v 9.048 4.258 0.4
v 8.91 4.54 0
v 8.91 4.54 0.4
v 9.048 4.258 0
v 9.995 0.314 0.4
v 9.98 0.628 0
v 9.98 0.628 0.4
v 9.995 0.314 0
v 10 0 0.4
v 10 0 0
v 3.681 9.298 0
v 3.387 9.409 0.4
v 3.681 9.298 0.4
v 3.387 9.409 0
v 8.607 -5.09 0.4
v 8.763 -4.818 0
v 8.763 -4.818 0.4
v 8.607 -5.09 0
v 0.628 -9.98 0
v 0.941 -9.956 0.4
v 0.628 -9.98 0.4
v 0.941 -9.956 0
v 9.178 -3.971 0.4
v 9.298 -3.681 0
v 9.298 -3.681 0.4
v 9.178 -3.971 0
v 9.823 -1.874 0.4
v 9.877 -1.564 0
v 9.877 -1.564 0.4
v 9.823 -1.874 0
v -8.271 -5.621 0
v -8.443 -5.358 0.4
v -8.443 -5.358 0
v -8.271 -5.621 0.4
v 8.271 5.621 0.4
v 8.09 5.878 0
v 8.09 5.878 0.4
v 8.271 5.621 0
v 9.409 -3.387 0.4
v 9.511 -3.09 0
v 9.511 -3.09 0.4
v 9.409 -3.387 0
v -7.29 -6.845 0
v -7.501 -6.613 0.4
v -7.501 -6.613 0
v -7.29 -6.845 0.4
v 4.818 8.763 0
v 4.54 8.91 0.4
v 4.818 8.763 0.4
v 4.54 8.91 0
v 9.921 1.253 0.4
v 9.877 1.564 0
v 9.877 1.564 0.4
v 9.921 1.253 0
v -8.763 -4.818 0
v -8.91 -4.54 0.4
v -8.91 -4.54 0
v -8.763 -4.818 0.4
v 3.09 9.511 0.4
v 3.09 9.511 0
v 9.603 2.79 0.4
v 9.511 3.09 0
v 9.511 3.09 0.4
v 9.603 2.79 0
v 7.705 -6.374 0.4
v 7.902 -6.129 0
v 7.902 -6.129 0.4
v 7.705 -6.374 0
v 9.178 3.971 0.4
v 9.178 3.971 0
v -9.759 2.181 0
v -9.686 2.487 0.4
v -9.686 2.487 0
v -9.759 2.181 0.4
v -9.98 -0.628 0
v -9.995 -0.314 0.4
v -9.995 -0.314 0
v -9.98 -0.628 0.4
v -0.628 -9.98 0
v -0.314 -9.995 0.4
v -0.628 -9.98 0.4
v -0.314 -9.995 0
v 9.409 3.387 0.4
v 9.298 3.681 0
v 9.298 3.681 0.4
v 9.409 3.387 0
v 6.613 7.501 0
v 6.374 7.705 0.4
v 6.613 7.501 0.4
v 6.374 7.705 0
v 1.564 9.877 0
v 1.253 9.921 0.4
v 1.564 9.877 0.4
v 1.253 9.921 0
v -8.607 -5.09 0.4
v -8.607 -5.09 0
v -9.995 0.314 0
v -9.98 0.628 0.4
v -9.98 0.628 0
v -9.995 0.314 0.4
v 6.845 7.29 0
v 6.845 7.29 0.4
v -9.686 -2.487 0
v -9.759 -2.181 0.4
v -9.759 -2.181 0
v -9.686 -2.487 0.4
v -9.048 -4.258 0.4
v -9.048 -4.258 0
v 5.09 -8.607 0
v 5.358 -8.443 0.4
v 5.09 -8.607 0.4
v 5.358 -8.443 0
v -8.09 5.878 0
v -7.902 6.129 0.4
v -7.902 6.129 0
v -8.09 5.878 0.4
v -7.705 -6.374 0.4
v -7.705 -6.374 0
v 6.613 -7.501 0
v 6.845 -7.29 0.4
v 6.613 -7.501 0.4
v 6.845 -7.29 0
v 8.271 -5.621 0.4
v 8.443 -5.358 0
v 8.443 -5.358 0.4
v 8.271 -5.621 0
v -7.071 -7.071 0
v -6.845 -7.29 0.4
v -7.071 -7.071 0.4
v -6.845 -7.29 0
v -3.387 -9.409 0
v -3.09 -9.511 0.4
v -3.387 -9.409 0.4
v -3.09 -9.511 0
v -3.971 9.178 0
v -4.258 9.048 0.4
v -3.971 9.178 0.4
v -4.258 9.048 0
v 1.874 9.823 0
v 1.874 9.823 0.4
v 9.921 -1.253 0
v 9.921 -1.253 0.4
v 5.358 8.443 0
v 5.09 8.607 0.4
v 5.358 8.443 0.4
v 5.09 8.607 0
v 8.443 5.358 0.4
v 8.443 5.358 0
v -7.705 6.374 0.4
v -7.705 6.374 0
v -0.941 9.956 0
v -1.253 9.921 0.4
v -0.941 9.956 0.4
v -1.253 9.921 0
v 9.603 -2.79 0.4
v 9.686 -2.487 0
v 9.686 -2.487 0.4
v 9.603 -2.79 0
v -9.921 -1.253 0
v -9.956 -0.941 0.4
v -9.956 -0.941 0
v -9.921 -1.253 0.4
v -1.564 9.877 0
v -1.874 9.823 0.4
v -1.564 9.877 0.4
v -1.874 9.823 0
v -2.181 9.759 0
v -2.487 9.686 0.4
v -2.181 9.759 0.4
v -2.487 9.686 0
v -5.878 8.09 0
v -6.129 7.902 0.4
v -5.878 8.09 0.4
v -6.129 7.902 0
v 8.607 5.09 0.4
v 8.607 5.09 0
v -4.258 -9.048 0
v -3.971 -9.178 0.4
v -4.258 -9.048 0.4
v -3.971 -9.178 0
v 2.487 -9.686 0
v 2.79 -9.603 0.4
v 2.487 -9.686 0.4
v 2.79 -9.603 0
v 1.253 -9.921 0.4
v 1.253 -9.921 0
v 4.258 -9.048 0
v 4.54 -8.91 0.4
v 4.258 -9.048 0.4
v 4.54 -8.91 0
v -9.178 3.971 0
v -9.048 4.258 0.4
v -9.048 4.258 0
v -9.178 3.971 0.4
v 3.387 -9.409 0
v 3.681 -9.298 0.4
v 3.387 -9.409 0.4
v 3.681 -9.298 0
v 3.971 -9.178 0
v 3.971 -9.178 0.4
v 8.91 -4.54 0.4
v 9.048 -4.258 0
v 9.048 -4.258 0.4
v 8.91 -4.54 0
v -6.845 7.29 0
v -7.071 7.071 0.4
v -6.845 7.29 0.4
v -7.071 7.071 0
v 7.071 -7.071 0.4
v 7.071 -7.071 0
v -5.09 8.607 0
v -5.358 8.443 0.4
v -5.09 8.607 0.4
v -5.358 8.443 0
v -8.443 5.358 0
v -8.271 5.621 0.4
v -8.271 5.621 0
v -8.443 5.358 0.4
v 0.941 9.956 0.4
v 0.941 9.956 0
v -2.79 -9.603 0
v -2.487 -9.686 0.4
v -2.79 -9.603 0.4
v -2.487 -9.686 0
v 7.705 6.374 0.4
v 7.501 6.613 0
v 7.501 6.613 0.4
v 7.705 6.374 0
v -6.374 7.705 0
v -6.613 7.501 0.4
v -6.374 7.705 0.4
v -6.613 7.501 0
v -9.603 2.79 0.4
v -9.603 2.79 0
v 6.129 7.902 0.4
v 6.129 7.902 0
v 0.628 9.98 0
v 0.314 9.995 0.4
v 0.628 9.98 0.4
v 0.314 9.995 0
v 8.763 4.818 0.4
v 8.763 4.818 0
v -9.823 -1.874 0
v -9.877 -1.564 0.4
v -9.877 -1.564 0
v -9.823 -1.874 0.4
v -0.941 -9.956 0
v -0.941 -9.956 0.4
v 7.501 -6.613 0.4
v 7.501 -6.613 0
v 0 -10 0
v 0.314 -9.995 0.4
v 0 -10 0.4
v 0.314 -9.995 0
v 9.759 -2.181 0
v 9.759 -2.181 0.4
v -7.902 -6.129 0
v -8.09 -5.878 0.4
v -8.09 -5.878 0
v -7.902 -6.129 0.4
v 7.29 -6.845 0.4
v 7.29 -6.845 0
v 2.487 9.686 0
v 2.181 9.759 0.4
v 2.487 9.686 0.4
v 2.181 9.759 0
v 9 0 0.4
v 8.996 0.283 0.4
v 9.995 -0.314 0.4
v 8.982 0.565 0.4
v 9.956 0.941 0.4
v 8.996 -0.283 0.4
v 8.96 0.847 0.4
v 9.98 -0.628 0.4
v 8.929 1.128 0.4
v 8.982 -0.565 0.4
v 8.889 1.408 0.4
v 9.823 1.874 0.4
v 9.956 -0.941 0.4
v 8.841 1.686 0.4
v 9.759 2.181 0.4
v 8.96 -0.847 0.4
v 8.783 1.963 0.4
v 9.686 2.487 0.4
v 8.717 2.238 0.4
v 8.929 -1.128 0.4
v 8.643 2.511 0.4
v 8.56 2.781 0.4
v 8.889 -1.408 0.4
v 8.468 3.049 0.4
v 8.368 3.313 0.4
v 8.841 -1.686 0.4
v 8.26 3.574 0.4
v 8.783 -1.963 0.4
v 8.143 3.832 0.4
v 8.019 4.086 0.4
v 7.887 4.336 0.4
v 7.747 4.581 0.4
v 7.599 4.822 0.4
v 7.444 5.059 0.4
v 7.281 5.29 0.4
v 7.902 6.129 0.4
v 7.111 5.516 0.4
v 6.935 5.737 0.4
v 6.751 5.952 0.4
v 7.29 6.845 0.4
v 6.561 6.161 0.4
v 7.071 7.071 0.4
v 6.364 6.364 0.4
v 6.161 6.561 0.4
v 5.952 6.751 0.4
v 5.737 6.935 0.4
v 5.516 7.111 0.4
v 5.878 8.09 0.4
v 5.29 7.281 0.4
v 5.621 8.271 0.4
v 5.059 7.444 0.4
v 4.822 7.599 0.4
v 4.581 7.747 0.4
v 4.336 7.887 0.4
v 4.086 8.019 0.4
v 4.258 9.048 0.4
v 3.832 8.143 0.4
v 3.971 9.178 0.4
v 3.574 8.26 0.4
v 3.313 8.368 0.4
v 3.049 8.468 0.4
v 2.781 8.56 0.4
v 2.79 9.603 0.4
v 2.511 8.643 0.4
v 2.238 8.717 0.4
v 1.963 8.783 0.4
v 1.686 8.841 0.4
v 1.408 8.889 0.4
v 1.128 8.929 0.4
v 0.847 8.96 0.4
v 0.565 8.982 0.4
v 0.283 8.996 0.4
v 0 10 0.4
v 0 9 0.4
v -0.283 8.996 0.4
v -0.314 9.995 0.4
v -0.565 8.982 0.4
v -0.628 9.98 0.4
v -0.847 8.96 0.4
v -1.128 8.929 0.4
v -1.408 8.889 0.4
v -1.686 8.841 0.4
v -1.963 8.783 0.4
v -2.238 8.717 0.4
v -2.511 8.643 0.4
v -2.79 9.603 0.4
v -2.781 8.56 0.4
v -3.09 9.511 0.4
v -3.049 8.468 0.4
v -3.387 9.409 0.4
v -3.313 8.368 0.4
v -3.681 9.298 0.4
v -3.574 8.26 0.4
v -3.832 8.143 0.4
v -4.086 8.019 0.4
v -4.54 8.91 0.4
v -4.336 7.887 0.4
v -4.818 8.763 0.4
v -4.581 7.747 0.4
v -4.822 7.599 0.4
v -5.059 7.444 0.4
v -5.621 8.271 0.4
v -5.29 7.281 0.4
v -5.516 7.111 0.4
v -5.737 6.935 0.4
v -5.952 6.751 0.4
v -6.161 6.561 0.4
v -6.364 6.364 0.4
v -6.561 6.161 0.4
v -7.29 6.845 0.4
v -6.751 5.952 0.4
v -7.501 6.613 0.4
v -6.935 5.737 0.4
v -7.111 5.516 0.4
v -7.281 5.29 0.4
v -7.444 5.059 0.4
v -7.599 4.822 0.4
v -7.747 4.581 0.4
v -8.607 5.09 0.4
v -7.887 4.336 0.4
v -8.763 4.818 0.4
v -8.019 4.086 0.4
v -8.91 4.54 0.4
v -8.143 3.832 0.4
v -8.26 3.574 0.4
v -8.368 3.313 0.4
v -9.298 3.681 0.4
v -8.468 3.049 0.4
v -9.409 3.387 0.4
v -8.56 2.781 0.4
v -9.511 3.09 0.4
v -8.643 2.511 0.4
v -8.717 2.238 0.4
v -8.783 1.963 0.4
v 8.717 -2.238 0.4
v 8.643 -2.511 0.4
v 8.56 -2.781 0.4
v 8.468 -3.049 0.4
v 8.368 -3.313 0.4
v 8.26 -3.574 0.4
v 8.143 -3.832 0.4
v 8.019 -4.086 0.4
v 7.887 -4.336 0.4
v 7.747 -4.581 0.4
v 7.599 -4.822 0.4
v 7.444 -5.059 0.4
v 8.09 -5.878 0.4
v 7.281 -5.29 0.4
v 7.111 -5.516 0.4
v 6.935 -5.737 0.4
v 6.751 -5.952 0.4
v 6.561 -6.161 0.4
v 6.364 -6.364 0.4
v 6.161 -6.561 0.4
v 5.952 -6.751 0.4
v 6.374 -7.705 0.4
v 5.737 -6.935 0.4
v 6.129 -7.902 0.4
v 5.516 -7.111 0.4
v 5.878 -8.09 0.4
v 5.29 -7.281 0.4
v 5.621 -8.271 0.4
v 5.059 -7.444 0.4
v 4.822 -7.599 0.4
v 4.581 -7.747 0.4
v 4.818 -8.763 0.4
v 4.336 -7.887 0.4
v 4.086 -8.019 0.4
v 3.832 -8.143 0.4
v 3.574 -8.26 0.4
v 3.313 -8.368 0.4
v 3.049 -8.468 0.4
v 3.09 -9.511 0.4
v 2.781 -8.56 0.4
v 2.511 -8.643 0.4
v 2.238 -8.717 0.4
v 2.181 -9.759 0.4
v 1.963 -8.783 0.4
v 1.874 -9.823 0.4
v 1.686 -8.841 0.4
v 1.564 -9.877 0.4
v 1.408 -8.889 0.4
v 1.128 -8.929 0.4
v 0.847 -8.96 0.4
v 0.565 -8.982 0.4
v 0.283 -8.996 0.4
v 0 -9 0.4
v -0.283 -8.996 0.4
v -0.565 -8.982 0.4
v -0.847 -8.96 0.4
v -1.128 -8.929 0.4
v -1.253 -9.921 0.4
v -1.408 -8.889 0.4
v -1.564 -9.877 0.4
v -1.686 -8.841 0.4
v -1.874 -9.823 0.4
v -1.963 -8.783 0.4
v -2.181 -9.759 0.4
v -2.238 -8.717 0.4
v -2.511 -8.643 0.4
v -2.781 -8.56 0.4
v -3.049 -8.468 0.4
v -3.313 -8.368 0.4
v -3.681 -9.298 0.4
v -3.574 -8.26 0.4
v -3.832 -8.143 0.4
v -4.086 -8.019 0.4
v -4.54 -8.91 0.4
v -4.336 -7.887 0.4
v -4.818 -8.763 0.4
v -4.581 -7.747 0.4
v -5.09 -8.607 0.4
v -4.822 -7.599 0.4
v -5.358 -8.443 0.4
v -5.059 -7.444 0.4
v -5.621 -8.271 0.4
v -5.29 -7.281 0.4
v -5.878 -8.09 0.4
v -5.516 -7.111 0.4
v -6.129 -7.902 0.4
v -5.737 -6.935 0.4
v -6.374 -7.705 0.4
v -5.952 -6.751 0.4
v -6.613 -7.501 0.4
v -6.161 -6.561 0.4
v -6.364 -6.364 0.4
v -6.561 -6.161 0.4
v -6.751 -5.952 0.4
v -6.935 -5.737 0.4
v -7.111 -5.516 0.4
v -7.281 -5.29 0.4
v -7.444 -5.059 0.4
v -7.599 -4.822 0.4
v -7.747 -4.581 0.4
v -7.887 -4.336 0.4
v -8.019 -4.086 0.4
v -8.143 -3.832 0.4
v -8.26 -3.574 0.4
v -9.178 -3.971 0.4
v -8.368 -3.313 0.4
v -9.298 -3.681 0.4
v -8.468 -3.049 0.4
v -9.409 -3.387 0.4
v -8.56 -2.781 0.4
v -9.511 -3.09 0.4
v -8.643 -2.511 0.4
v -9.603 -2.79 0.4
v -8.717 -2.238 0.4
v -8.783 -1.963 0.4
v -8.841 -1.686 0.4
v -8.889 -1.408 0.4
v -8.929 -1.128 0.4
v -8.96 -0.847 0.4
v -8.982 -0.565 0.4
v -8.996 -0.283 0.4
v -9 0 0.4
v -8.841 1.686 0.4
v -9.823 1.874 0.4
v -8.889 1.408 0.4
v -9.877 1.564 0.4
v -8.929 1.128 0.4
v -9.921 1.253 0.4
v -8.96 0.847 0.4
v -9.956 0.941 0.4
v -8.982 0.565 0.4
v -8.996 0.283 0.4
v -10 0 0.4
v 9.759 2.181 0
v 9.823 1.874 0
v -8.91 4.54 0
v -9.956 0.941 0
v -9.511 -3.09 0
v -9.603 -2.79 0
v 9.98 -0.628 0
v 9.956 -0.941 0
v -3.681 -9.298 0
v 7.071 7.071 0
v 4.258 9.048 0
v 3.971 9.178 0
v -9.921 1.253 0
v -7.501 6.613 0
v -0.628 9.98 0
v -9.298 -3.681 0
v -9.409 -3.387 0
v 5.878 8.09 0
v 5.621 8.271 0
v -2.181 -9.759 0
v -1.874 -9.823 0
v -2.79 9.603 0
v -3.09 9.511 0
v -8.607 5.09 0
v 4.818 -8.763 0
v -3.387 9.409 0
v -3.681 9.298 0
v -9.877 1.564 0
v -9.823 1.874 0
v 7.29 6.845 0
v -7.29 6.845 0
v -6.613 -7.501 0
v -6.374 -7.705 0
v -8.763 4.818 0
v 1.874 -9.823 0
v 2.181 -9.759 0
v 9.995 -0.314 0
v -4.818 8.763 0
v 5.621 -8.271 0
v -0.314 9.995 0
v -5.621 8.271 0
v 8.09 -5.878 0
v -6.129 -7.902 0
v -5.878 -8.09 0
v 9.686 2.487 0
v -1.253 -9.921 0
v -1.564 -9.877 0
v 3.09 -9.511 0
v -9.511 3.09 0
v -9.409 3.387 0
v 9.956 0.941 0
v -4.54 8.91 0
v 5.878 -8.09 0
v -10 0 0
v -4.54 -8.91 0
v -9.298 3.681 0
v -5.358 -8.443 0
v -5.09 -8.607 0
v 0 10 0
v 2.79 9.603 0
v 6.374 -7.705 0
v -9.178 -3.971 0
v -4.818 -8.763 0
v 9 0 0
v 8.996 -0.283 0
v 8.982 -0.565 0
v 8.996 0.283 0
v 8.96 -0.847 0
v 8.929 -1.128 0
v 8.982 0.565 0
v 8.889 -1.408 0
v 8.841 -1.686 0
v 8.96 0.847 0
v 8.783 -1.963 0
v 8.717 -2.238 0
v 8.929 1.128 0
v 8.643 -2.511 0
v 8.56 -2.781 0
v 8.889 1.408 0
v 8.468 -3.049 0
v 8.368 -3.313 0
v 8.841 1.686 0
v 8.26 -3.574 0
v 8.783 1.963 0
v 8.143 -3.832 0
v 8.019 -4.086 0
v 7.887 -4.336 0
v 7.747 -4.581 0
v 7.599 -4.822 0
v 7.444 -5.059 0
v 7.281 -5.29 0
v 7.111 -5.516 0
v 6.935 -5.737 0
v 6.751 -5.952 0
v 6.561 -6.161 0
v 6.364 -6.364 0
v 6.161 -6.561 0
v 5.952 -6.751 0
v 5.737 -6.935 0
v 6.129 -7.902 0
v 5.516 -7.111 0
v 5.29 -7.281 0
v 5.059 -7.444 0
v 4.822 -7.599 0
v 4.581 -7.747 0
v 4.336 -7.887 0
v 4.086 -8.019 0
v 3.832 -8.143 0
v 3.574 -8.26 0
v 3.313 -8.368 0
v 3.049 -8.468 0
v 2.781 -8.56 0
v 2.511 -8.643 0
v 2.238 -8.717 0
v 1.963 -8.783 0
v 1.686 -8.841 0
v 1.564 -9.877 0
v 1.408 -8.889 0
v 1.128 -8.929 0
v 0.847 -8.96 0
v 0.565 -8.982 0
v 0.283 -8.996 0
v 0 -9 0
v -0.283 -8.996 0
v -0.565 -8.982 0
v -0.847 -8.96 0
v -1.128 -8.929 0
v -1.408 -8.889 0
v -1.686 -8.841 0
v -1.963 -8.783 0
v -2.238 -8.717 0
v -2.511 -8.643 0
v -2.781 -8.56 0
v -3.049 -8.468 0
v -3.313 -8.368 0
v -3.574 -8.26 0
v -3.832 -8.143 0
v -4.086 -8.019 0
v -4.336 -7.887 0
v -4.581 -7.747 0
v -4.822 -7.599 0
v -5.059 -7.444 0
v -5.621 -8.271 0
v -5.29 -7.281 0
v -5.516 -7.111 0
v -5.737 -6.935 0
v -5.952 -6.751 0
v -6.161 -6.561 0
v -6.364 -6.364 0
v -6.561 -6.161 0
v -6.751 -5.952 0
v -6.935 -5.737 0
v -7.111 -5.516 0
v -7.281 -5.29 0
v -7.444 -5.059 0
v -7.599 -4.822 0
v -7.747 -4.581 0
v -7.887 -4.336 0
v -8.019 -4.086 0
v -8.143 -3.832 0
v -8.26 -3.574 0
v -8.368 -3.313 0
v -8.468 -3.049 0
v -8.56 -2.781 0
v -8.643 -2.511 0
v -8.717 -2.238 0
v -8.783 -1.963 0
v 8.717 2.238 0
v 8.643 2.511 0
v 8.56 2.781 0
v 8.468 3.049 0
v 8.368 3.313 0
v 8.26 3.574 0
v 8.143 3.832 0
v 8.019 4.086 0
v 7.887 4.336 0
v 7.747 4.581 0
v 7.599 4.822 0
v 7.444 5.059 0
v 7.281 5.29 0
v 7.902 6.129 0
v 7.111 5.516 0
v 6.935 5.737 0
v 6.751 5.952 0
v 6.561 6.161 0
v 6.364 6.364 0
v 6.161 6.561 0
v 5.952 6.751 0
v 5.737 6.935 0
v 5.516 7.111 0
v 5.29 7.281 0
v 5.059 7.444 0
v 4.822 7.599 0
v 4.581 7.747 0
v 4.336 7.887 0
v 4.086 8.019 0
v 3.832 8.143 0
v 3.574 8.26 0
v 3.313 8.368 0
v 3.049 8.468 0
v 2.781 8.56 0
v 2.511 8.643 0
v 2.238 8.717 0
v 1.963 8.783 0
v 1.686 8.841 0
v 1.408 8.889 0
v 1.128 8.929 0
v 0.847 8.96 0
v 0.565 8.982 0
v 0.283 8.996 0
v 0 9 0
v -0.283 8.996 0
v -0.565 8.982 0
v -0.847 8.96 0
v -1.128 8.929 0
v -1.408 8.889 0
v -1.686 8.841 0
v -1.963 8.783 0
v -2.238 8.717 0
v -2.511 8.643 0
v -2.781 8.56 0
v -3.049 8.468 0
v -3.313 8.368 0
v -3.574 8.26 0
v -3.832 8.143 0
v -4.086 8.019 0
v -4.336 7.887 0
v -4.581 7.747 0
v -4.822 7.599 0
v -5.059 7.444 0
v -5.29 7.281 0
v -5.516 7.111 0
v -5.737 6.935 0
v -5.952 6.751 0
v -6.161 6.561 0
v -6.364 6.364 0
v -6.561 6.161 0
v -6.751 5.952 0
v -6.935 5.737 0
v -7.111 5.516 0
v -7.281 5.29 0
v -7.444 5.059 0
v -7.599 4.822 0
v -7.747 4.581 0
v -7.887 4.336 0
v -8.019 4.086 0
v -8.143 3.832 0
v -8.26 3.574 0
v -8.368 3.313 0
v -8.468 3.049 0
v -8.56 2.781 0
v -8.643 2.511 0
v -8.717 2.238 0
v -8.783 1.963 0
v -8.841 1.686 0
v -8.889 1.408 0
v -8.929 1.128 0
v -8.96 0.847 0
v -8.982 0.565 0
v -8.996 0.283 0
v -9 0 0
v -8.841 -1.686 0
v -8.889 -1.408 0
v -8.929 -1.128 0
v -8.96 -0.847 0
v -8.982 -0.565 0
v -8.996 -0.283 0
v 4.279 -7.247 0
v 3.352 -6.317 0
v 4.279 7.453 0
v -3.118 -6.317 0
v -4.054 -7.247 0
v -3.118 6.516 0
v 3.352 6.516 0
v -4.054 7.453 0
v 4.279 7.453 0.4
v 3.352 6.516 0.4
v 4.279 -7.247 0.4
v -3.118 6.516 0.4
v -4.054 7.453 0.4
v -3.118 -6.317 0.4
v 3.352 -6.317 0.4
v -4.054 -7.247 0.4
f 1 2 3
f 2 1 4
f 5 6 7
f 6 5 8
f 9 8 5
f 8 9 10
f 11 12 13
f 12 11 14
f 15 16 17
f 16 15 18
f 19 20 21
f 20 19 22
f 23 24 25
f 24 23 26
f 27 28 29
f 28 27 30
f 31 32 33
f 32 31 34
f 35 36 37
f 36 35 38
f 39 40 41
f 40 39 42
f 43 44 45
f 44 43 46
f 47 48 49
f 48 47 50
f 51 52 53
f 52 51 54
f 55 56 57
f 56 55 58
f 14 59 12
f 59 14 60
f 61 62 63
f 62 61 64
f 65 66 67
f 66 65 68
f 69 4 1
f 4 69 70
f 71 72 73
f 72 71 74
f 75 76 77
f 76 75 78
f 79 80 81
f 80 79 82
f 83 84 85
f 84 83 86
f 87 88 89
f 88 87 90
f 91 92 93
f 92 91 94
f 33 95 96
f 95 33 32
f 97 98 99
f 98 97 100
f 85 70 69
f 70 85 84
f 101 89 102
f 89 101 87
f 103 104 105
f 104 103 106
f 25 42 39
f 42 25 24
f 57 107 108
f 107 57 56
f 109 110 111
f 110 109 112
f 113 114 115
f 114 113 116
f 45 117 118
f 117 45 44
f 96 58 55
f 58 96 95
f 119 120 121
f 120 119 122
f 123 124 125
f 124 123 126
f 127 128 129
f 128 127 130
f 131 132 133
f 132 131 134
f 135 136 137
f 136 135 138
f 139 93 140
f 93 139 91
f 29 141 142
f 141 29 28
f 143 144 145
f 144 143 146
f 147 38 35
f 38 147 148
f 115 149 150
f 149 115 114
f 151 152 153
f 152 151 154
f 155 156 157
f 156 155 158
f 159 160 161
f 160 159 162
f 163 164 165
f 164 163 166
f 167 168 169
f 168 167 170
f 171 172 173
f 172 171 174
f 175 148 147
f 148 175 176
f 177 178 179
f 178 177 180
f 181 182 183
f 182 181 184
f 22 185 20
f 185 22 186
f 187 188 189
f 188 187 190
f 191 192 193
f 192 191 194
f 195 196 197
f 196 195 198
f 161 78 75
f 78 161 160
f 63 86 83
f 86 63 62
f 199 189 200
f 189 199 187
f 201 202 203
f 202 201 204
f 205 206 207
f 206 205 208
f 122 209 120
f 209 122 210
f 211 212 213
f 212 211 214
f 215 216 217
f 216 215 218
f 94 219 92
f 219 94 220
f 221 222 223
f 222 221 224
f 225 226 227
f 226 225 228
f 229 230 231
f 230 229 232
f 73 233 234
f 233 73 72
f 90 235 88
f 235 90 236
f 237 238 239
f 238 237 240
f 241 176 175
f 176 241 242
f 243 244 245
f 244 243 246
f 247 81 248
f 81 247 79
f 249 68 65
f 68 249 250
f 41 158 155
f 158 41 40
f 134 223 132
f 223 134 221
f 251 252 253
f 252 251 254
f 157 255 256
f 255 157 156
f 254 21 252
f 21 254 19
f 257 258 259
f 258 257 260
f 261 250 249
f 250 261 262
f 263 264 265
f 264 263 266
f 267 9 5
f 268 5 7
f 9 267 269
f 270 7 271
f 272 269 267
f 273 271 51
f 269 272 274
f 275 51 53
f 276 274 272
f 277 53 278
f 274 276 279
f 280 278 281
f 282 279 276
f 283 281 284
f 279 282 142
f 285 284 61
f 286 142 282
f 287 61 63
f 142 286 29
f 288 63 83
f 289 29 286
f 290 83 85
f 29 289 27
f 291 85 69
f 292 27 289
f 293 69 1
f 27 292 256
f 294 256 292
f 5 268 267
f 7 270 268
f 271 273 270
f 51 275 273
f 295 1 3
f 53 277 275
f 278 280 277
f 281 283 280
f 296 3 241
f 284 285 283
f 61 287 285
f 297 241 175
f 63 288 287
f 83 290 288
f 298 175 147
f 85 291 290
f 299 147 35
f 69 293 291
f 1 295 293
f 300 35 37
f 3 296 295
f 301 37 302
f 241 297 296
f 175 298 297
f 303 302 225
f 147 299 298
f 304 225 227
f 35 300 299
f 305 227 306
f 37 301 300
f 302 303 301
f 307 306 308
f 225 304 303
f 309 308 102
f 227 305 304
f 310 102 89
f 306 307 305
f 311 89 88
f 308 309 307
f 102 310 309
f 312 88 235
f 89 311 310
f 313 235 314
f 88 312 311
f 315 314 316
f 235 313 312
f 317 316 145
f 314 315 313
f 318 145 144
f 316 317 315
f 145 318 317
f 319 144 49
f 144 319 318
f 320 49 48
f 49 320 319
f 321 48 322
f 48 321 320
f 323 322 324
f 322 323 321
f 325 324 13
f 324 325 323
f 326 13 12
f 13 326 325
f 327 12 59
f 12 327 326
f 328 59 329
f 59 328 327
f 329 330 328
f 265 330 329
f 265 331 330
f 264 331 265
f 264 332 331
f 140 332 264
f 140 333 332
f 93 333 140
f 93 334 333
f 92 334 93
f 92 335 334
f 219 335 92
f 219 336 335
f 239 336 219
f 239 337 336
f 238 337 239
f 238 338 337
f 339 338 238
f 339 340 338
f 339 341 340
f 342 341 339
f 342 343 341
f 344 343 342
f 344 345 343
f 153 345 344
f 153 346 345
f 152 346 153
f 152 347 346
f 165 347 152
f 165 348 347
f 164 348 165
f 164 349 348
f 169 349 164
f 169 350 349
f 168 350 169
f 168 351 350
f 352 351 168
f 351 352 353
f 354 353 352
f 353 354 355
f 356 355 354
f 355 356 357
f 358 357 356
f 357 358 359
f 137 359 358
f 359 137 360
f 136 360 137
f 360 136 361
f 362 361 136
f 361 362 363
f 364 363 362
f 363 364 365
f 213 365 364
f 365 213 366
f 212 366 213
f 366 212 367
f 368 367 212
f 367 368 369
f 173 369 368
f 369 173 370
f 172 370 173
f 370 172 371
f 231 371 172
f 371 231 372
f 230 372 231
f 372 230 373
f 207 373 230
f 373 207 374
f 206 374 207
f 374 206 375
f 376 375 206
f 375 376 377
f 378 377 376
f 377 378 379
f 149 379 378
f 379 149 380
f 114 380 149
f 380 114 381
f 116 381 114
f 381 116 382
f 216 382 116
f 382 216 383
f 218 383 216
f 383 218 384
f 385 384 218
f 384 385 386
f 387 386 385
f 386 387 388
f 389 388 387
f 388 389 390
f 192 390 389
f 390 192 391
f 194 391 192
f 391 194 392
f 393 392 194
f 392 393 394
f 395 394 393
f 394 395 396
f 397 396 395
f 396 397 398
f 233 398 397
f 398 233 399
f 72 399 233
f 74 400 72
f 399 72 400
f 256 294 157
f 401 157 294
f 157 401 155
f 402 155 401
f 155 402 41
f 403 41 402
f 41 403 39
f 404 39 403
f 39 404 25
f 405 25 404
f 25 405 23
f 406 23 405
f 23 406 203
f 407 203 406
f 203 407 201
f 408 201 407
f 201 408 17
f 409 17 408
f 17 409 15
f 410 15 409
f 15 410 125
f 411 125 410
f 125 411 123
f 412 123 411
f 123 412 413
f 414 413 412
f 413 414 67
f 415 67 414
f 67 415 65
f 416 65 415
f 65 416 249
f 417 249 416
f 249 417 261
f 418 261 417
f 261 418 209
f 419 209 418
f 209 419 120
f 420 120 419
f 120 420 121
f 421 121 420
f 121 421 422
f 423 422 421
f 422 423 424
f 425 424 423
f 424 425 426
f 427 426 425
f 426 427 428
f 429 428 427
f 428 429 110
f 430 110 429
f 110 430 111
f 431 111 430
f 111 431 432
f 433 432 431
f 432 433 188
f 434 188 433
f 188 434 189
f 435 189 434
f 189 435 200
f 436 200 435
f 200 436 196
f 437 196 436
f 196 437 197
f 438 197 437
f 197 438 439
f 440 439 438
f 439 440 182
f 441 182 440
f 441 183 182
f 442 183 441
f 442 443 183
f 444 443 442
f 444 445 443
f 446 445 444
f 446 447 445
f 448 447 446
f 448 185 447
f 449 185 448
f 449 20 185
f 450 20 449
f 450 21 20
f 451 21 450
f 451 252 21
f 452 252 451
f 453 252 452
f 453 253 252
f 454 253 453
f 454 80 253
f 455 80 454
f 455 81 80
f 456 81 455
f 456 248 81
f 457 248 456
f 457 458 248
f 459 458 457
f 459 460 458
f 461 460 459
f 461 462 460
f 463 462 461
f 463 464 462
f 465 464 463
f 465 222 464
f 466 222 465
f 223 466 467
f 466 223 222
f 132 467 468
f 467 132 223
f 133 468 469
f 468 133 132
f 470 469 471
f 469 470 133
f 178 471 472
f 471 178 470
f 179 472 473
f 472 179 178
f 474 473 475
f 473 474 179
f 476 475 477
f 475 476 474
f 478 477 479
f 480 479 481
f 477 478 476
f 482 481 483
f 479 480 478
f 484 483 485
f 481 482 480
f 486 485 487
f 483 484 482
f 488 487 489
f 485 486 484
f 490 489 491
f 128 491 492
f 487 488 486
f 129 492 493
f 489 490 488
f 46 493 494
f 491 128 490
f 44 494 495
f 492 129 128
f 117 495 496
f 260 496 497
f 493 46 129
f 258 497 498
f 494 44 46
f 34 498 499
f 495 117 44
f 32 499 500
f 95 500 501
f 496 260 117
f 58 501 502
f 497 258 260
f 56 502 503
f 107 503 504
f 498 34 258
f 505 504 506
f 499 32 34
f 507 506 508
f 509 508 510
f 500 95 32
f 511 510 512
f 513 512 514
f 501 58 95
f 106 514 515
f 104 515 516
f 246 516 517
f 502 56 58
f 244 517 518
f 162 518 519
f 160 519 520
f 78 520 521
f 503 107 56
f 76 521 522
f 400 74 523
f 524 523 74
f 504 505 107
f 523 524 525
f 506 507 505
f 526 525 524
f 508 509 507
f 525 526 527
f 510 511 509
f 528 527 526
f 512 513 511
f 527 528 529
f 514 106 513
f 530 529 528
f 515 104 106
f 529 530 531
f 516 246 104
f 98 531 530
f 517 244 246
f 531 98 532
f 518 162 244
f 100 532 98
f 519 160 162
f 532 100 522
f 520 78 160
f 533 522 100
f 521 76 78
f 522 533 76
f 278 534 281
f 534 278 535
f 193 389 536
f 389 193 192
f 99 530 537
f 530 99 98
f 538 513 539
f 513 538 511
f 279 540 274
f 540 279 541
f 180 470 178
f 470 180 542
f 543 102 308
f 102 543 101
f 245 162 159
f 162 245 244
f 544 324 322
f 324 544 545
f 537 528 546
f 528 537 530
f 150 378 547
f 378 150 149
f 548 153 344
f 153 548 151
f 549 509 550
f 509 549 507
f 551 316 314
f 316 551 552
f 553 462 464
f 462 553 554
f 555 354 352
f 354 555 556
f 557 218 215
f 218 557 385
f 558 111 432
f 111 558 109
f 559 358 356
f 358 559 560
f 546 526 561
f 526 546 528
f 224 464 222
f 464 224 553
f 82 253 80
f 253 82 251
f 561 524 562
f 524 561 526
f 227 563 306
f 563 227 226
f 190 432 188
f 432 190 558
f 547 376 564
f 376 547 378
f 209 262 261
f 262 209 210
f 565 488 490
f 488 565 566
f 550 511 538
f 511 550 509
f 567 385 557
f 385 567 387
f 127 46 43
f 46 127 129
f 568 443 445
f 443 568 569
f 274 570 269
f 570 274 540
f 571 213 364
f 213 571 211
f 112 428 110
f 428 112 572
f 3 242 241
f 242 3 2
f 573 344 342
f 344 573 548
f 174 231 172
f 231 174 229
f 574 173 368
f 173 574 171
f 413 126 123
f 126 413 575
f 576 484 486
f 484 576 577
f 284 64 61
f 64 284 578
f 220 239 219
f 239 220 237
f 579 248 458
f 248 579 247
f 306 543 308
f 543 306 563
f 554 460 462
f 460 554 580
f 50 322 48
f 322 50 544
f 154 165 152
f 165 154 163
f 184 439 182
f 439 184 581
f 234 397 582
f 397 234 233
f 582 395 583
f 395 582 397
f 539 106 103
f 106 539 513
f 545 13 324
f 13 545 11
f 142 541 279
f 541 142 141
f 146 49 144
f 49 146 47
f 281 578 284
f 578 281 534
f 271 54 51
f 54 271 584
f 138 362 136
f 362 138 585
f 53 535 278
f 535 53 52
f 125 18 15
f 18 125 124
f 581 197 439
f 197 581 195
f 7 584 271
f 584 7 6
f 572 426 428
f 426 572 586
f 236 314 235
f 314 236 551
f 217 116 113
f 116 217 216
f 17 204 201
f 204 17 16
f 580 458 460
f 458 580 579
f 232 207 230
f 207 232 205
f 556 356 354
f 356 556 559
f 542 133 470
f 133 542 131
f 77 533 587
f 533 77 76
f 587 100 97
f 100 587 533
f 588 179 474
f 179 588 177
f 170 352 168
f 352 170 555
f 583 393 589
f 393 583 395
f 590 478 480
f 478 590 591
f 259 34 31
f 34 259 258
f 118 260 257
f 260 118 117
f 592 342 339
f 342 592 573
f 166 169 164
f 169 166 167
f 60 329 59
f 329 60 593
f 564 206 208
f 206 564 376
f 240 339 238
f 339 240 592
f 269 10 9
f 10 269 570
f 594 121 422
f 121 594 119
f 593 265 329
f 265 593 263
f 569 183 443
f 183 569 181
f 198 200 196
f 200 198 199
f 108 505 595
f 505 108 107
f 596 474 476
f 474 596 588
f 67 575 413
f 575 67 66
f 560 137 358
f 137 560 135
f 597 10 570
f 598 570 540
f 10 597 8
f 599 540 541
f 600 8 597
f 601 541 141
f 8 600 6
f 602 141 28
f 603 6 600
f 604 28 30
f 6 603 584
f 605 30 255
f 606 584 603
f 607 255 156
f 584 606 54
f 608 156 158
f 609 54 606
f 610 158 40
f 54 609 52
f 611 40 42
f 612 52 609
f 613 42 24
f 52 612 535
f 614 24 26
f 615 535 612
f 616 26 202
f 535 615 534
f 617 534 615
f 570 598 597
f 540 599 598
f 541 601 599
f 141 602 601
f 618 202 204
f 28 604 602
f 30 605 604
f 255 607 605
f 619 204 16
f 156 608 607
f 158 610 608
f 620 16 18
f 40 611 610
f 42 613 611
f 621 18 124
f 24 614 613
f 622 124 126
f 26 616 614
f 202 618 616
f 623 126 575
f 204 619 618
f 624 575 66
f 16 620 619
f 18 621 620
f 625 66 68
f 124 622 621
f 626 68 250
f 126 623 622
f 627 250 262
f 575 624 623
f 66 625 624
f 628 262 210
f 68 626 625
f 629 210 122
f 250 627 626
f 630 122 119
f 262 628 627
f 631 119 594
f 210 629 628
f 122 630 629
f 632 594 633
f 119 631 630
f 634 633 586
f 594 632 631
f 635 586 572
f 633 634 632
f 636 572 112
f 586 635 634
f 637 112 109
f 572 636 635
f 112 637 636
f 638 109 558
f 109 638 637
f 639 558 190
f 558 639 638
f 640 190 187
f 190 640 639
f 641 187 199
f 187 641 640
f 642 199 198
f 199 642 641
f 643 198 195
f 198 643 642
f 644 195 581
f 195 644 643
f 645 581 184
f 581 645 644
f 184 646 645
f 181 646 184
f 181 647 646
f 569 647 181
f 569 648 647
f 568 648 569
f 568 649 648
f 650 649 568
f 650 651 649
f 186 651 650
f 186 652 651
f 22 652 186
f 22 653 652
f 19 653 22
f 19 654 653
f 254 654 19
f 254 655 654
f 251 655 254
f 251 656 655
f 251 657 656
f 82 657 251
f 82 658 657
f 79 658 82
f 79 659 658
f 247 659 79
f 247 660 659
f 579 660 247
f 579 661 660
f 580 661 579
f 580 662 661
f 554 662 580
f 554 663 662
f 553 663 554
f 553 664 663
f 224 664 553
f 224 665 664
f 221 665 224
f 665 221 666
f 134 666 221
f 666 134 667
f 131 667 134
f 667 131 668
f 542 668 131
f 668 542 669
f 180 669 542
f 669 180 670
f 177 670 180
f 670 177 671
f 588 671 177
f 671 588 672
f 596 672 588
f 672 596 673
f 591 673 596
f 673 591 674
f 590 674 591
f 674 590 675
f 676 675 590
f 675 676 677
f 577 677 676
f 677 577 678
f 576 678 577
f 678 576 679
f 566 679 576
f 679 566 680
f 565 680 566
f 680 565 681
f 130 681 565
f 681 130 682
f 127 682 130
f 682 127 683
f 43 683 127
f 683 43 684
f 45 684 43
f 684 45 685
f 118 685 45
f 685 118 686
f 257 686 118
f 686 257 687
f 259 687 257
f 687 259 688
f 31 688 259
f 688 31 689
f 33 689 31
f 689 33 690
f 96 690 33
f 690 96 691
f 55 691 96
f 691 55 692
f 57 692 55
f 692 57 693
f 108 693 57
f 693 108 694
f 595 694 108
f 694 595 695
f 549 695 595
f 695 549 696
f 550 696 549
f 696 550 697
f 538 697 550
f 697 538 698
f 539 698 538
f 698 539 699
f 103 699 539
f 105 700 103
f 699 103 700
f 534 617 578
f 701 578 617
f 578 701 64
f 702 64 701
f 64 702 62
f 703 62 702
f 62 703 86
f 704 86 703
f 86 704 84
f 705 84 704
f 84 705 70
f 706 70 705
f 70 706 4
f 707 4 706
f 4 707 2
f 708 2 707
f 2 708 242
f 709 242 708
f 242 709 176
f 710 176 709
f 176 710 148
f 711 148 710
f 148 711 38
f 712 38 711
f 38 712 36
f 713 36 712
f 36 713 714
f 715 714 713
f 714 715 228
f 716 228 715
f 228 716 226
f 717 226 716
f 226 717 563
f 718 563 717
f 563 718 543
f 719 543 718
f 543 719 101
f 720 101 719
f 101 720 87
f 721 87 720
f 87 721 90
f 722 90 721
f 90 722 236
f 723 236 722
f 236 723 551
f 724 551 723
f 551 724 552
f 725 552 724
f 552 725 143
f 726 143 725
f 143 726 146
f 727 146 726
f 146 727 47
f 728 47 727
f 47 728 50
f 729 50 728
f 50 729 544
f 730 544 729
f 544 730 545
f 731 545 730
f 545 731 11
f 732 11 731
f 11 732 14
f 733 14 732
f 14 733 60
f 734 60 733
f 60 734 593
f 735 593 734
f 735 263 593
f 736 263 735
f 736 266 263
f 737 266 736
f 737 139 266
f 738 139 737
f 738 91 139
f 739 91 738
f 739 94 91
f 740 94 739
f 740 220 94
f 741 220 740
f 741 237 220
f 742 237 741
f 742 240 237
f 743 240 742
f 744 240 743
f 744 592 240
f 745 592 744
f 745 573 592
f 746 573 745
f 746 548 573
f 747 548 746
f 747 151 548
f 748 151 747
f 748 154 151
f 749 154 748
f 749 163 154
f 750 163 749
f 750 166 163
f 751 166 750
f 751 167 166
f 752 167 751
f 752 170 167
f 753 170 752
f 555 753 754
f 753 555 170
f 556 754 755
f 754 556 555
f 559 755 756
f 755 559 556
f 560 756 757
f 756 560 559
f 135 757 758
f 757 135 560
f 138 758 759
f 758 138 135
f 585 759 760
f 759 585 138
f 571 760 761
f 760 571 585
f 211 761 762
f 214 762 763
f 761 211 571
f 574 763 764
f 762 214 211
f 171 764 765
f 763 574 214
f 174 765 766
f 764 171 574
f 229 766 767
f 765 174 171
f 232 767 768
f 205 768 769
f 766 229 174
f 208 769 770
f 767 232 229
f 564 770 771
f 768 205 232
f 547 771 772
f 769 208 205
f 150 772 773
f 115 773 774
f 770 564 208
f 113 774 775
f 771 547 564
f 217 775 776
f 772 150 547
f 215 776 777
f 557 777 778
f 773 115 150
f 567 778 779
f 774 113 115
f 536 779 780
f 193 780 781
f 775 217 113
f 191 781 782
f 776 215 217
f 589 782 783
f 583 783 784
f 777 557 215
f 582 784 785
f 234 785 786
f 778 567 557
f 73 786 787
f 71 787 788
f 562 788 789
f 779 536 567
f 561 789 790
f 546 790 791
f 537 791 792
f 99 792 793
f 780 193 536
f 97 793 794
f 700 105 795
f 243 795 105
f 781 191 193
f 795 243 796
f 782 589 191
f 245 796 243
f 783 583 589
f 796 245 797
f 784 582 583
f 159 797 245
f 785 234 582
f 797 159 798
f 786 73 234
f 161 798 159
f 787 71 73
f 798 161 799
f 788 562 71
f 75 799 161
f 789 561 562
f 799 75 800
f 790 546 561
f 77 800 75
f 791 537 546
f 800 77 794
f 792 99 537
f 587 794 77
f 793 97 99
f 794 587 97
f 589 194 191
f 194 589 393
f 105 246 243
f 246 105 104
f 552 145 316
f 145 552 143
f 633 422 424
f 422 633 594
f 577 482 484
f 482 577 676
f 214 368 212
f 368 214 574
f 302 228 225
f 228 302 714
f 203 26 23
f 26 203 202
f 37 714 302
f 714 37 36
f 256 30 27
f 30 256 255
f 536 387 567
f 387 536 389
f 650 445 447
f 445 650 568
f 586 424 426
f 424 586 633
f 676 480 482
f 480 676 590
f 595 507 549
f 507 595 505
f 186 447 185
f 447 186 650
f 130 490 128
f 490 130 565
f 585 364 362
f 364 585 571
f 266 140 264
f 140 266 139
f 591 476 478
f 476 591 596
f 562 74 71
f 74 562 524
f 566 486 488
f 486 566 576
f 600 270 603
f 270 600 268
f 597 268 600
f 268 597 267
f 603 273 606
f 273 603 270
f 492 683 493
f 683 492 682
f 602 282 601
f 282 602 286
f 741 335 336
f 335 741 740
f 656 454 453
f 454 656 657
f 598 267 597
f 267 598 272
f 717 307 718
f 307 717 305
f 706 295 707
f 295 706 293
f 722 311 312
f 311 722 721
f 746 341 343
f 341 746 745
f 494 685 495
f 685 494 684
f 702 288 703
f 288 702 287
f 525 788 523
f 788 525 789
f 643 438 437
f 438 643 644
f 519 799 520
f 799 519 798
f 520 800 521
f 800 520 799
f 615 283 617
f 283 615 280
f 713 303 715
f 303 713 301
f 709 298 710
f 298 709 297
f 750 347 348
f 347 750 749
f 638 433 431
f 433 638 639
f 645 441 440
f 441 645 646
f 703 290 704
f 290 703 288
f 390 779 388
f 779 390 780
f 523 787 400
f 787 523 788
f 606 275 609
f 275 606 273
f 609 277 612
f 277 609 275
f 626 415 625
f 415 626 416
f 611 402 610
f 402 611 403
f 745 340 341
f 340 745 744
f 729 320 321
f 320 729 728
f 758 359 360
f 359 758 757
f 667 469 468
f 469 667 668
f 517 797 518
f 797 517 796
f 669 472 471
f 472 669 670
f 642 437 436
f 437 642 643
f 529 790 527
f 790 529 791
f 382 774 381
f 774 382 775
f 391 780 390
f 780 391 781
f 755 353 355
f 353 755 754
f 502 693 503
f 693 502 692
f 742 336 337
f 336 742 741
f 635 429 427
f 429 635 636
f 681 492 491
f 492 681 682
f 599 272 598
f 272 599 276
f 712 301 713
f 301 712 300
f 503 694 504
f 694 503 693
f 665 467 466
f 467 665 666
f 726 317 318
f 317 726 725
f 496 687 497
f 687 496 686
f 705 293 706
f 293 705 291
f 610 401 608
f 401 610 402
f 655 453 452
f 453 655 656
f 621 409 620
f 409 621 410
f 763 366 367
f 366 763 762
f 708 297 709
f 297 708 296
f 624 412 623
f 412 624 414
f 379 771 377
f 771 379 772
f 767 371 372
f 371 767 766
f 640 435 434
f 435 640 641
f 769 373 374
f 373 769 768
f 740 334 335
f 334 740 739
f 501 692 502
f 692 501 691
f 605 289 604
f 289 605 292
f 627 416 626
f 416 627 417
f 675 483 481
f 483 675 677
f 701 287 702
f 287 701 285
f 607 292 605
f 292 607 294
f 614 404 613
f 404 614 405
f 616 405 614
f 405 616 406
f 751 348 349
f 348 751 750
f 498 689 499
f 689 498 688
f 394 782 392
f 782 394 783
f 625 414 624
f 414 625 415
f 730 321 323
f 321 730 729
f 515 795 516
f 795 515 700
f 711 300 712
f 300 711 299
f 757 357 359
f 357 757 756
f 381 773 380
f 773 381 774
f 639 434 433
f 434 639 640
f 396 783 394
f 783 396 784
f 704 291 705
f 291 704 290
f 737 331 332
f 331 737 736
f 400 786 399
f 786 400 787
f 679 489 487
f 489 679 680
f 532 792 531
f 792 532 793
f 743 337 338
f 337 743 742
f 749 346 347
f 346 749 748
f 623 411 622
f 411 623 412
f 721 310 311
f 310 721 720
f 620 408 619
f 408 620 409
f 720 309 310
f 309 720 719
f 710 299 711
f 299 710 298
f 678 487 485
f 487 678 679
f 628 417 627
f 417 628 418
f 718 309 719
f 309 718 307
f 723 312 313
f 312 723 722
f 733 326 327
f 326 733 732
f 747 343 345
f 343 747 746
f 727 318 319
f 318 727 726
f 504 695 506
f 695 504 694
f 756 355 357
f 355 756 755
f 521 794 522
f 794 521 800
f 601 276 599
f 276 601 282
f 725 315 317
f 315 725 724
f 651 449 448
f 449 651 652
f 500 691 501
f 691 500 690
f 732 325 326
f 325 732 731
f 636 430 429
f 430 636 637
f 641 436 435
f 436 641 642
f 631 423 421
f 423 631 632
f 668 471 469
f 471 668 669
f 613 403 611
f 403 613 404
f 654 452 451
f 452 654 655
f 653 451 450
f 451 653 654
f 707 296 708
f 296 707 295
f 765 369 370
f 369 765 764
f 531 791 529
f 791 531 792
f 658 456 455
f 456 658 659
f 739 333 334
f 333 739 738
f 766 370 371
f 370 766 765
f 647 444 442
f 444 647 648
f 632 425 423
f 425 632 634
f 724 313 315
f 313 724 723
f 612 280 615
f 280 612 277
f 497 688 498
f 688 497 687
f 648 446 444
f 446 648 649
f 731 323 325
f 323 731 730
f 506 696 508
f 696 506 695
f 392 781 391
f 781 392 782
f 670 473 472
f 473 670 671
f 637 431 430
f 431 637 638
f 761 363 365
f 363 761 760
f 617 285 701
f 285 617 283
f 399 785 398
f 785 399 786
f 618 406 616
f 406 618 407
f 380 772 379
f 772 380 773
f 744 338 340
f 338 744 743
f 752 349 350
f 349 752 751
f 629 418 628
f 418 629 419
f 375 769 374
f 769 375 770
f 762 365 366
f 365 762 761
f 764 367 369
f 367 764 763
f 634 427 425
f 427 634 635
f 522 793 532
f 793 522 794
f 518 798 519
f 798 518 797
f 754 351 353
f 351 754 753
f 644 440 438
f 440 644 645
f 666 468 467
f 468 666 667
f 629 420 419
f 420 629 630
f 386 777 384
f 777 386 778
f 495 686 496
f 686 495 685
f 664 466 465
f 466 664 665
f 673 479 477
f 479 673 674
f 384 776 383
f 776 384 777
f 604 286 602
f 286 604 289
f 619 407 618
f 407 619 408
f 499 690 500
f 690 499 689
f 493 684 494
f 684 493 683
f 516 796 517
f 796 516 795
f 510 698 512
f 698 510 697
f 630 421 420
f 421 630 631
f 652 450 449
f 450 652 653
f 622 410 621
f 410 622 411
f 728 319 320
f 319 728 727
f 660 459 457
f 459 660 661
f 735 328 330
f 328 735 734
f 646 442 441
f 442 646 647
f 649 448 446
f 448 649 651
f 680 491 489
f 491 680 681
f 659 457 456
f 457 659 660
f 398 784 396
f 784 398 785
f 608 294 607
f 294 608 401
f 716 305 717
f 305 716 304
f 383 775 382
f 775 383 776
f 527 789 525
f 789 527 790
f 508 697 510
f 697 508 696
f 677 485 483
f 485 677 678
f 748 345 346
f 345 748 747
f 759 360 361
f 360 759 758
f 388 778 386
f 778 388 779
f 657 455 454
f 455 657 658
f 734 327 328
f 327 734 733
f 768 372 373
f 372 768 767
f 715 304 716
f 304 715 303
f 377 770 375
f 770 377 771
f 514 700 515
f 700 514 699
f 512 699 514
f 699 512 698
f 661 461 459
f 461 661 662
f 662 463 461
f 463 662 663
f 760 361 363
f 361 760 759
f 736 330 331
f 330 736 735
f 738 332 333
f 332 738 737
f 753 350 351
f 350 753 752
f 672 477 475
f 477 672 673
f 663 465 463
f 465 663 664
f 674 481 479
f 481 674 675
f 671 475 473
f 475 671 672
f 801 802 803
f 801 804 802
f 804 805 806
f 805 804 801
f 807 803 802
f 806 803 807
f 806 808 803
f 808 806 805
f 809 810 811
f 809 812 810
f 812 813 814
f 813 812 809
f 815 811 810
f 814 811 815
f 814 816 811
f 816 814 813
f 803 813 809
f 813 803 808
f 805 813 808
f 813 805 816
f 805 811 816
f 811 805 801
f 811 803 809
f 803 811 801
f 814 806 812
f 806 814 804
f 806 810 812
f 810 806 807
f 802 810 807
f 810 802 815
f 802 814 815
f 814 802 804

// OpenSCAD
module body(){
    intersection(){
        cylinder(r=12.5,h=10,center=true,$fn=200);
        scale([1,1,0.8])sphere(r=12.5,$fn=200);
    }
}

module ring(){
    difference(){
        cylinder(r=10,h=0.6,$fn=200);
        cylinder(r=9,h=0.6,$fn=200);
    }
}

module male(text){
    difference(){
        cylinder(r=10,h=0.4,$fn=200);
        cylinder(r=9,h=0.4,$fn=200);
    }
    
    linear_extrude(0.4){
        text(text,size=12,valign="center",halign="center",font="LiSu",$fn=100);
    }
}

module female(text){
    difference(){
        body();
        translate([0,0,4.41])ring();
        translate([0,0,4.4])linear_extrude(0.6){
            text(text,size=12,valign="center",halign="center",font="LiSu",$fn=100);
        }
    }
}

male("傌");
//female("傌");
